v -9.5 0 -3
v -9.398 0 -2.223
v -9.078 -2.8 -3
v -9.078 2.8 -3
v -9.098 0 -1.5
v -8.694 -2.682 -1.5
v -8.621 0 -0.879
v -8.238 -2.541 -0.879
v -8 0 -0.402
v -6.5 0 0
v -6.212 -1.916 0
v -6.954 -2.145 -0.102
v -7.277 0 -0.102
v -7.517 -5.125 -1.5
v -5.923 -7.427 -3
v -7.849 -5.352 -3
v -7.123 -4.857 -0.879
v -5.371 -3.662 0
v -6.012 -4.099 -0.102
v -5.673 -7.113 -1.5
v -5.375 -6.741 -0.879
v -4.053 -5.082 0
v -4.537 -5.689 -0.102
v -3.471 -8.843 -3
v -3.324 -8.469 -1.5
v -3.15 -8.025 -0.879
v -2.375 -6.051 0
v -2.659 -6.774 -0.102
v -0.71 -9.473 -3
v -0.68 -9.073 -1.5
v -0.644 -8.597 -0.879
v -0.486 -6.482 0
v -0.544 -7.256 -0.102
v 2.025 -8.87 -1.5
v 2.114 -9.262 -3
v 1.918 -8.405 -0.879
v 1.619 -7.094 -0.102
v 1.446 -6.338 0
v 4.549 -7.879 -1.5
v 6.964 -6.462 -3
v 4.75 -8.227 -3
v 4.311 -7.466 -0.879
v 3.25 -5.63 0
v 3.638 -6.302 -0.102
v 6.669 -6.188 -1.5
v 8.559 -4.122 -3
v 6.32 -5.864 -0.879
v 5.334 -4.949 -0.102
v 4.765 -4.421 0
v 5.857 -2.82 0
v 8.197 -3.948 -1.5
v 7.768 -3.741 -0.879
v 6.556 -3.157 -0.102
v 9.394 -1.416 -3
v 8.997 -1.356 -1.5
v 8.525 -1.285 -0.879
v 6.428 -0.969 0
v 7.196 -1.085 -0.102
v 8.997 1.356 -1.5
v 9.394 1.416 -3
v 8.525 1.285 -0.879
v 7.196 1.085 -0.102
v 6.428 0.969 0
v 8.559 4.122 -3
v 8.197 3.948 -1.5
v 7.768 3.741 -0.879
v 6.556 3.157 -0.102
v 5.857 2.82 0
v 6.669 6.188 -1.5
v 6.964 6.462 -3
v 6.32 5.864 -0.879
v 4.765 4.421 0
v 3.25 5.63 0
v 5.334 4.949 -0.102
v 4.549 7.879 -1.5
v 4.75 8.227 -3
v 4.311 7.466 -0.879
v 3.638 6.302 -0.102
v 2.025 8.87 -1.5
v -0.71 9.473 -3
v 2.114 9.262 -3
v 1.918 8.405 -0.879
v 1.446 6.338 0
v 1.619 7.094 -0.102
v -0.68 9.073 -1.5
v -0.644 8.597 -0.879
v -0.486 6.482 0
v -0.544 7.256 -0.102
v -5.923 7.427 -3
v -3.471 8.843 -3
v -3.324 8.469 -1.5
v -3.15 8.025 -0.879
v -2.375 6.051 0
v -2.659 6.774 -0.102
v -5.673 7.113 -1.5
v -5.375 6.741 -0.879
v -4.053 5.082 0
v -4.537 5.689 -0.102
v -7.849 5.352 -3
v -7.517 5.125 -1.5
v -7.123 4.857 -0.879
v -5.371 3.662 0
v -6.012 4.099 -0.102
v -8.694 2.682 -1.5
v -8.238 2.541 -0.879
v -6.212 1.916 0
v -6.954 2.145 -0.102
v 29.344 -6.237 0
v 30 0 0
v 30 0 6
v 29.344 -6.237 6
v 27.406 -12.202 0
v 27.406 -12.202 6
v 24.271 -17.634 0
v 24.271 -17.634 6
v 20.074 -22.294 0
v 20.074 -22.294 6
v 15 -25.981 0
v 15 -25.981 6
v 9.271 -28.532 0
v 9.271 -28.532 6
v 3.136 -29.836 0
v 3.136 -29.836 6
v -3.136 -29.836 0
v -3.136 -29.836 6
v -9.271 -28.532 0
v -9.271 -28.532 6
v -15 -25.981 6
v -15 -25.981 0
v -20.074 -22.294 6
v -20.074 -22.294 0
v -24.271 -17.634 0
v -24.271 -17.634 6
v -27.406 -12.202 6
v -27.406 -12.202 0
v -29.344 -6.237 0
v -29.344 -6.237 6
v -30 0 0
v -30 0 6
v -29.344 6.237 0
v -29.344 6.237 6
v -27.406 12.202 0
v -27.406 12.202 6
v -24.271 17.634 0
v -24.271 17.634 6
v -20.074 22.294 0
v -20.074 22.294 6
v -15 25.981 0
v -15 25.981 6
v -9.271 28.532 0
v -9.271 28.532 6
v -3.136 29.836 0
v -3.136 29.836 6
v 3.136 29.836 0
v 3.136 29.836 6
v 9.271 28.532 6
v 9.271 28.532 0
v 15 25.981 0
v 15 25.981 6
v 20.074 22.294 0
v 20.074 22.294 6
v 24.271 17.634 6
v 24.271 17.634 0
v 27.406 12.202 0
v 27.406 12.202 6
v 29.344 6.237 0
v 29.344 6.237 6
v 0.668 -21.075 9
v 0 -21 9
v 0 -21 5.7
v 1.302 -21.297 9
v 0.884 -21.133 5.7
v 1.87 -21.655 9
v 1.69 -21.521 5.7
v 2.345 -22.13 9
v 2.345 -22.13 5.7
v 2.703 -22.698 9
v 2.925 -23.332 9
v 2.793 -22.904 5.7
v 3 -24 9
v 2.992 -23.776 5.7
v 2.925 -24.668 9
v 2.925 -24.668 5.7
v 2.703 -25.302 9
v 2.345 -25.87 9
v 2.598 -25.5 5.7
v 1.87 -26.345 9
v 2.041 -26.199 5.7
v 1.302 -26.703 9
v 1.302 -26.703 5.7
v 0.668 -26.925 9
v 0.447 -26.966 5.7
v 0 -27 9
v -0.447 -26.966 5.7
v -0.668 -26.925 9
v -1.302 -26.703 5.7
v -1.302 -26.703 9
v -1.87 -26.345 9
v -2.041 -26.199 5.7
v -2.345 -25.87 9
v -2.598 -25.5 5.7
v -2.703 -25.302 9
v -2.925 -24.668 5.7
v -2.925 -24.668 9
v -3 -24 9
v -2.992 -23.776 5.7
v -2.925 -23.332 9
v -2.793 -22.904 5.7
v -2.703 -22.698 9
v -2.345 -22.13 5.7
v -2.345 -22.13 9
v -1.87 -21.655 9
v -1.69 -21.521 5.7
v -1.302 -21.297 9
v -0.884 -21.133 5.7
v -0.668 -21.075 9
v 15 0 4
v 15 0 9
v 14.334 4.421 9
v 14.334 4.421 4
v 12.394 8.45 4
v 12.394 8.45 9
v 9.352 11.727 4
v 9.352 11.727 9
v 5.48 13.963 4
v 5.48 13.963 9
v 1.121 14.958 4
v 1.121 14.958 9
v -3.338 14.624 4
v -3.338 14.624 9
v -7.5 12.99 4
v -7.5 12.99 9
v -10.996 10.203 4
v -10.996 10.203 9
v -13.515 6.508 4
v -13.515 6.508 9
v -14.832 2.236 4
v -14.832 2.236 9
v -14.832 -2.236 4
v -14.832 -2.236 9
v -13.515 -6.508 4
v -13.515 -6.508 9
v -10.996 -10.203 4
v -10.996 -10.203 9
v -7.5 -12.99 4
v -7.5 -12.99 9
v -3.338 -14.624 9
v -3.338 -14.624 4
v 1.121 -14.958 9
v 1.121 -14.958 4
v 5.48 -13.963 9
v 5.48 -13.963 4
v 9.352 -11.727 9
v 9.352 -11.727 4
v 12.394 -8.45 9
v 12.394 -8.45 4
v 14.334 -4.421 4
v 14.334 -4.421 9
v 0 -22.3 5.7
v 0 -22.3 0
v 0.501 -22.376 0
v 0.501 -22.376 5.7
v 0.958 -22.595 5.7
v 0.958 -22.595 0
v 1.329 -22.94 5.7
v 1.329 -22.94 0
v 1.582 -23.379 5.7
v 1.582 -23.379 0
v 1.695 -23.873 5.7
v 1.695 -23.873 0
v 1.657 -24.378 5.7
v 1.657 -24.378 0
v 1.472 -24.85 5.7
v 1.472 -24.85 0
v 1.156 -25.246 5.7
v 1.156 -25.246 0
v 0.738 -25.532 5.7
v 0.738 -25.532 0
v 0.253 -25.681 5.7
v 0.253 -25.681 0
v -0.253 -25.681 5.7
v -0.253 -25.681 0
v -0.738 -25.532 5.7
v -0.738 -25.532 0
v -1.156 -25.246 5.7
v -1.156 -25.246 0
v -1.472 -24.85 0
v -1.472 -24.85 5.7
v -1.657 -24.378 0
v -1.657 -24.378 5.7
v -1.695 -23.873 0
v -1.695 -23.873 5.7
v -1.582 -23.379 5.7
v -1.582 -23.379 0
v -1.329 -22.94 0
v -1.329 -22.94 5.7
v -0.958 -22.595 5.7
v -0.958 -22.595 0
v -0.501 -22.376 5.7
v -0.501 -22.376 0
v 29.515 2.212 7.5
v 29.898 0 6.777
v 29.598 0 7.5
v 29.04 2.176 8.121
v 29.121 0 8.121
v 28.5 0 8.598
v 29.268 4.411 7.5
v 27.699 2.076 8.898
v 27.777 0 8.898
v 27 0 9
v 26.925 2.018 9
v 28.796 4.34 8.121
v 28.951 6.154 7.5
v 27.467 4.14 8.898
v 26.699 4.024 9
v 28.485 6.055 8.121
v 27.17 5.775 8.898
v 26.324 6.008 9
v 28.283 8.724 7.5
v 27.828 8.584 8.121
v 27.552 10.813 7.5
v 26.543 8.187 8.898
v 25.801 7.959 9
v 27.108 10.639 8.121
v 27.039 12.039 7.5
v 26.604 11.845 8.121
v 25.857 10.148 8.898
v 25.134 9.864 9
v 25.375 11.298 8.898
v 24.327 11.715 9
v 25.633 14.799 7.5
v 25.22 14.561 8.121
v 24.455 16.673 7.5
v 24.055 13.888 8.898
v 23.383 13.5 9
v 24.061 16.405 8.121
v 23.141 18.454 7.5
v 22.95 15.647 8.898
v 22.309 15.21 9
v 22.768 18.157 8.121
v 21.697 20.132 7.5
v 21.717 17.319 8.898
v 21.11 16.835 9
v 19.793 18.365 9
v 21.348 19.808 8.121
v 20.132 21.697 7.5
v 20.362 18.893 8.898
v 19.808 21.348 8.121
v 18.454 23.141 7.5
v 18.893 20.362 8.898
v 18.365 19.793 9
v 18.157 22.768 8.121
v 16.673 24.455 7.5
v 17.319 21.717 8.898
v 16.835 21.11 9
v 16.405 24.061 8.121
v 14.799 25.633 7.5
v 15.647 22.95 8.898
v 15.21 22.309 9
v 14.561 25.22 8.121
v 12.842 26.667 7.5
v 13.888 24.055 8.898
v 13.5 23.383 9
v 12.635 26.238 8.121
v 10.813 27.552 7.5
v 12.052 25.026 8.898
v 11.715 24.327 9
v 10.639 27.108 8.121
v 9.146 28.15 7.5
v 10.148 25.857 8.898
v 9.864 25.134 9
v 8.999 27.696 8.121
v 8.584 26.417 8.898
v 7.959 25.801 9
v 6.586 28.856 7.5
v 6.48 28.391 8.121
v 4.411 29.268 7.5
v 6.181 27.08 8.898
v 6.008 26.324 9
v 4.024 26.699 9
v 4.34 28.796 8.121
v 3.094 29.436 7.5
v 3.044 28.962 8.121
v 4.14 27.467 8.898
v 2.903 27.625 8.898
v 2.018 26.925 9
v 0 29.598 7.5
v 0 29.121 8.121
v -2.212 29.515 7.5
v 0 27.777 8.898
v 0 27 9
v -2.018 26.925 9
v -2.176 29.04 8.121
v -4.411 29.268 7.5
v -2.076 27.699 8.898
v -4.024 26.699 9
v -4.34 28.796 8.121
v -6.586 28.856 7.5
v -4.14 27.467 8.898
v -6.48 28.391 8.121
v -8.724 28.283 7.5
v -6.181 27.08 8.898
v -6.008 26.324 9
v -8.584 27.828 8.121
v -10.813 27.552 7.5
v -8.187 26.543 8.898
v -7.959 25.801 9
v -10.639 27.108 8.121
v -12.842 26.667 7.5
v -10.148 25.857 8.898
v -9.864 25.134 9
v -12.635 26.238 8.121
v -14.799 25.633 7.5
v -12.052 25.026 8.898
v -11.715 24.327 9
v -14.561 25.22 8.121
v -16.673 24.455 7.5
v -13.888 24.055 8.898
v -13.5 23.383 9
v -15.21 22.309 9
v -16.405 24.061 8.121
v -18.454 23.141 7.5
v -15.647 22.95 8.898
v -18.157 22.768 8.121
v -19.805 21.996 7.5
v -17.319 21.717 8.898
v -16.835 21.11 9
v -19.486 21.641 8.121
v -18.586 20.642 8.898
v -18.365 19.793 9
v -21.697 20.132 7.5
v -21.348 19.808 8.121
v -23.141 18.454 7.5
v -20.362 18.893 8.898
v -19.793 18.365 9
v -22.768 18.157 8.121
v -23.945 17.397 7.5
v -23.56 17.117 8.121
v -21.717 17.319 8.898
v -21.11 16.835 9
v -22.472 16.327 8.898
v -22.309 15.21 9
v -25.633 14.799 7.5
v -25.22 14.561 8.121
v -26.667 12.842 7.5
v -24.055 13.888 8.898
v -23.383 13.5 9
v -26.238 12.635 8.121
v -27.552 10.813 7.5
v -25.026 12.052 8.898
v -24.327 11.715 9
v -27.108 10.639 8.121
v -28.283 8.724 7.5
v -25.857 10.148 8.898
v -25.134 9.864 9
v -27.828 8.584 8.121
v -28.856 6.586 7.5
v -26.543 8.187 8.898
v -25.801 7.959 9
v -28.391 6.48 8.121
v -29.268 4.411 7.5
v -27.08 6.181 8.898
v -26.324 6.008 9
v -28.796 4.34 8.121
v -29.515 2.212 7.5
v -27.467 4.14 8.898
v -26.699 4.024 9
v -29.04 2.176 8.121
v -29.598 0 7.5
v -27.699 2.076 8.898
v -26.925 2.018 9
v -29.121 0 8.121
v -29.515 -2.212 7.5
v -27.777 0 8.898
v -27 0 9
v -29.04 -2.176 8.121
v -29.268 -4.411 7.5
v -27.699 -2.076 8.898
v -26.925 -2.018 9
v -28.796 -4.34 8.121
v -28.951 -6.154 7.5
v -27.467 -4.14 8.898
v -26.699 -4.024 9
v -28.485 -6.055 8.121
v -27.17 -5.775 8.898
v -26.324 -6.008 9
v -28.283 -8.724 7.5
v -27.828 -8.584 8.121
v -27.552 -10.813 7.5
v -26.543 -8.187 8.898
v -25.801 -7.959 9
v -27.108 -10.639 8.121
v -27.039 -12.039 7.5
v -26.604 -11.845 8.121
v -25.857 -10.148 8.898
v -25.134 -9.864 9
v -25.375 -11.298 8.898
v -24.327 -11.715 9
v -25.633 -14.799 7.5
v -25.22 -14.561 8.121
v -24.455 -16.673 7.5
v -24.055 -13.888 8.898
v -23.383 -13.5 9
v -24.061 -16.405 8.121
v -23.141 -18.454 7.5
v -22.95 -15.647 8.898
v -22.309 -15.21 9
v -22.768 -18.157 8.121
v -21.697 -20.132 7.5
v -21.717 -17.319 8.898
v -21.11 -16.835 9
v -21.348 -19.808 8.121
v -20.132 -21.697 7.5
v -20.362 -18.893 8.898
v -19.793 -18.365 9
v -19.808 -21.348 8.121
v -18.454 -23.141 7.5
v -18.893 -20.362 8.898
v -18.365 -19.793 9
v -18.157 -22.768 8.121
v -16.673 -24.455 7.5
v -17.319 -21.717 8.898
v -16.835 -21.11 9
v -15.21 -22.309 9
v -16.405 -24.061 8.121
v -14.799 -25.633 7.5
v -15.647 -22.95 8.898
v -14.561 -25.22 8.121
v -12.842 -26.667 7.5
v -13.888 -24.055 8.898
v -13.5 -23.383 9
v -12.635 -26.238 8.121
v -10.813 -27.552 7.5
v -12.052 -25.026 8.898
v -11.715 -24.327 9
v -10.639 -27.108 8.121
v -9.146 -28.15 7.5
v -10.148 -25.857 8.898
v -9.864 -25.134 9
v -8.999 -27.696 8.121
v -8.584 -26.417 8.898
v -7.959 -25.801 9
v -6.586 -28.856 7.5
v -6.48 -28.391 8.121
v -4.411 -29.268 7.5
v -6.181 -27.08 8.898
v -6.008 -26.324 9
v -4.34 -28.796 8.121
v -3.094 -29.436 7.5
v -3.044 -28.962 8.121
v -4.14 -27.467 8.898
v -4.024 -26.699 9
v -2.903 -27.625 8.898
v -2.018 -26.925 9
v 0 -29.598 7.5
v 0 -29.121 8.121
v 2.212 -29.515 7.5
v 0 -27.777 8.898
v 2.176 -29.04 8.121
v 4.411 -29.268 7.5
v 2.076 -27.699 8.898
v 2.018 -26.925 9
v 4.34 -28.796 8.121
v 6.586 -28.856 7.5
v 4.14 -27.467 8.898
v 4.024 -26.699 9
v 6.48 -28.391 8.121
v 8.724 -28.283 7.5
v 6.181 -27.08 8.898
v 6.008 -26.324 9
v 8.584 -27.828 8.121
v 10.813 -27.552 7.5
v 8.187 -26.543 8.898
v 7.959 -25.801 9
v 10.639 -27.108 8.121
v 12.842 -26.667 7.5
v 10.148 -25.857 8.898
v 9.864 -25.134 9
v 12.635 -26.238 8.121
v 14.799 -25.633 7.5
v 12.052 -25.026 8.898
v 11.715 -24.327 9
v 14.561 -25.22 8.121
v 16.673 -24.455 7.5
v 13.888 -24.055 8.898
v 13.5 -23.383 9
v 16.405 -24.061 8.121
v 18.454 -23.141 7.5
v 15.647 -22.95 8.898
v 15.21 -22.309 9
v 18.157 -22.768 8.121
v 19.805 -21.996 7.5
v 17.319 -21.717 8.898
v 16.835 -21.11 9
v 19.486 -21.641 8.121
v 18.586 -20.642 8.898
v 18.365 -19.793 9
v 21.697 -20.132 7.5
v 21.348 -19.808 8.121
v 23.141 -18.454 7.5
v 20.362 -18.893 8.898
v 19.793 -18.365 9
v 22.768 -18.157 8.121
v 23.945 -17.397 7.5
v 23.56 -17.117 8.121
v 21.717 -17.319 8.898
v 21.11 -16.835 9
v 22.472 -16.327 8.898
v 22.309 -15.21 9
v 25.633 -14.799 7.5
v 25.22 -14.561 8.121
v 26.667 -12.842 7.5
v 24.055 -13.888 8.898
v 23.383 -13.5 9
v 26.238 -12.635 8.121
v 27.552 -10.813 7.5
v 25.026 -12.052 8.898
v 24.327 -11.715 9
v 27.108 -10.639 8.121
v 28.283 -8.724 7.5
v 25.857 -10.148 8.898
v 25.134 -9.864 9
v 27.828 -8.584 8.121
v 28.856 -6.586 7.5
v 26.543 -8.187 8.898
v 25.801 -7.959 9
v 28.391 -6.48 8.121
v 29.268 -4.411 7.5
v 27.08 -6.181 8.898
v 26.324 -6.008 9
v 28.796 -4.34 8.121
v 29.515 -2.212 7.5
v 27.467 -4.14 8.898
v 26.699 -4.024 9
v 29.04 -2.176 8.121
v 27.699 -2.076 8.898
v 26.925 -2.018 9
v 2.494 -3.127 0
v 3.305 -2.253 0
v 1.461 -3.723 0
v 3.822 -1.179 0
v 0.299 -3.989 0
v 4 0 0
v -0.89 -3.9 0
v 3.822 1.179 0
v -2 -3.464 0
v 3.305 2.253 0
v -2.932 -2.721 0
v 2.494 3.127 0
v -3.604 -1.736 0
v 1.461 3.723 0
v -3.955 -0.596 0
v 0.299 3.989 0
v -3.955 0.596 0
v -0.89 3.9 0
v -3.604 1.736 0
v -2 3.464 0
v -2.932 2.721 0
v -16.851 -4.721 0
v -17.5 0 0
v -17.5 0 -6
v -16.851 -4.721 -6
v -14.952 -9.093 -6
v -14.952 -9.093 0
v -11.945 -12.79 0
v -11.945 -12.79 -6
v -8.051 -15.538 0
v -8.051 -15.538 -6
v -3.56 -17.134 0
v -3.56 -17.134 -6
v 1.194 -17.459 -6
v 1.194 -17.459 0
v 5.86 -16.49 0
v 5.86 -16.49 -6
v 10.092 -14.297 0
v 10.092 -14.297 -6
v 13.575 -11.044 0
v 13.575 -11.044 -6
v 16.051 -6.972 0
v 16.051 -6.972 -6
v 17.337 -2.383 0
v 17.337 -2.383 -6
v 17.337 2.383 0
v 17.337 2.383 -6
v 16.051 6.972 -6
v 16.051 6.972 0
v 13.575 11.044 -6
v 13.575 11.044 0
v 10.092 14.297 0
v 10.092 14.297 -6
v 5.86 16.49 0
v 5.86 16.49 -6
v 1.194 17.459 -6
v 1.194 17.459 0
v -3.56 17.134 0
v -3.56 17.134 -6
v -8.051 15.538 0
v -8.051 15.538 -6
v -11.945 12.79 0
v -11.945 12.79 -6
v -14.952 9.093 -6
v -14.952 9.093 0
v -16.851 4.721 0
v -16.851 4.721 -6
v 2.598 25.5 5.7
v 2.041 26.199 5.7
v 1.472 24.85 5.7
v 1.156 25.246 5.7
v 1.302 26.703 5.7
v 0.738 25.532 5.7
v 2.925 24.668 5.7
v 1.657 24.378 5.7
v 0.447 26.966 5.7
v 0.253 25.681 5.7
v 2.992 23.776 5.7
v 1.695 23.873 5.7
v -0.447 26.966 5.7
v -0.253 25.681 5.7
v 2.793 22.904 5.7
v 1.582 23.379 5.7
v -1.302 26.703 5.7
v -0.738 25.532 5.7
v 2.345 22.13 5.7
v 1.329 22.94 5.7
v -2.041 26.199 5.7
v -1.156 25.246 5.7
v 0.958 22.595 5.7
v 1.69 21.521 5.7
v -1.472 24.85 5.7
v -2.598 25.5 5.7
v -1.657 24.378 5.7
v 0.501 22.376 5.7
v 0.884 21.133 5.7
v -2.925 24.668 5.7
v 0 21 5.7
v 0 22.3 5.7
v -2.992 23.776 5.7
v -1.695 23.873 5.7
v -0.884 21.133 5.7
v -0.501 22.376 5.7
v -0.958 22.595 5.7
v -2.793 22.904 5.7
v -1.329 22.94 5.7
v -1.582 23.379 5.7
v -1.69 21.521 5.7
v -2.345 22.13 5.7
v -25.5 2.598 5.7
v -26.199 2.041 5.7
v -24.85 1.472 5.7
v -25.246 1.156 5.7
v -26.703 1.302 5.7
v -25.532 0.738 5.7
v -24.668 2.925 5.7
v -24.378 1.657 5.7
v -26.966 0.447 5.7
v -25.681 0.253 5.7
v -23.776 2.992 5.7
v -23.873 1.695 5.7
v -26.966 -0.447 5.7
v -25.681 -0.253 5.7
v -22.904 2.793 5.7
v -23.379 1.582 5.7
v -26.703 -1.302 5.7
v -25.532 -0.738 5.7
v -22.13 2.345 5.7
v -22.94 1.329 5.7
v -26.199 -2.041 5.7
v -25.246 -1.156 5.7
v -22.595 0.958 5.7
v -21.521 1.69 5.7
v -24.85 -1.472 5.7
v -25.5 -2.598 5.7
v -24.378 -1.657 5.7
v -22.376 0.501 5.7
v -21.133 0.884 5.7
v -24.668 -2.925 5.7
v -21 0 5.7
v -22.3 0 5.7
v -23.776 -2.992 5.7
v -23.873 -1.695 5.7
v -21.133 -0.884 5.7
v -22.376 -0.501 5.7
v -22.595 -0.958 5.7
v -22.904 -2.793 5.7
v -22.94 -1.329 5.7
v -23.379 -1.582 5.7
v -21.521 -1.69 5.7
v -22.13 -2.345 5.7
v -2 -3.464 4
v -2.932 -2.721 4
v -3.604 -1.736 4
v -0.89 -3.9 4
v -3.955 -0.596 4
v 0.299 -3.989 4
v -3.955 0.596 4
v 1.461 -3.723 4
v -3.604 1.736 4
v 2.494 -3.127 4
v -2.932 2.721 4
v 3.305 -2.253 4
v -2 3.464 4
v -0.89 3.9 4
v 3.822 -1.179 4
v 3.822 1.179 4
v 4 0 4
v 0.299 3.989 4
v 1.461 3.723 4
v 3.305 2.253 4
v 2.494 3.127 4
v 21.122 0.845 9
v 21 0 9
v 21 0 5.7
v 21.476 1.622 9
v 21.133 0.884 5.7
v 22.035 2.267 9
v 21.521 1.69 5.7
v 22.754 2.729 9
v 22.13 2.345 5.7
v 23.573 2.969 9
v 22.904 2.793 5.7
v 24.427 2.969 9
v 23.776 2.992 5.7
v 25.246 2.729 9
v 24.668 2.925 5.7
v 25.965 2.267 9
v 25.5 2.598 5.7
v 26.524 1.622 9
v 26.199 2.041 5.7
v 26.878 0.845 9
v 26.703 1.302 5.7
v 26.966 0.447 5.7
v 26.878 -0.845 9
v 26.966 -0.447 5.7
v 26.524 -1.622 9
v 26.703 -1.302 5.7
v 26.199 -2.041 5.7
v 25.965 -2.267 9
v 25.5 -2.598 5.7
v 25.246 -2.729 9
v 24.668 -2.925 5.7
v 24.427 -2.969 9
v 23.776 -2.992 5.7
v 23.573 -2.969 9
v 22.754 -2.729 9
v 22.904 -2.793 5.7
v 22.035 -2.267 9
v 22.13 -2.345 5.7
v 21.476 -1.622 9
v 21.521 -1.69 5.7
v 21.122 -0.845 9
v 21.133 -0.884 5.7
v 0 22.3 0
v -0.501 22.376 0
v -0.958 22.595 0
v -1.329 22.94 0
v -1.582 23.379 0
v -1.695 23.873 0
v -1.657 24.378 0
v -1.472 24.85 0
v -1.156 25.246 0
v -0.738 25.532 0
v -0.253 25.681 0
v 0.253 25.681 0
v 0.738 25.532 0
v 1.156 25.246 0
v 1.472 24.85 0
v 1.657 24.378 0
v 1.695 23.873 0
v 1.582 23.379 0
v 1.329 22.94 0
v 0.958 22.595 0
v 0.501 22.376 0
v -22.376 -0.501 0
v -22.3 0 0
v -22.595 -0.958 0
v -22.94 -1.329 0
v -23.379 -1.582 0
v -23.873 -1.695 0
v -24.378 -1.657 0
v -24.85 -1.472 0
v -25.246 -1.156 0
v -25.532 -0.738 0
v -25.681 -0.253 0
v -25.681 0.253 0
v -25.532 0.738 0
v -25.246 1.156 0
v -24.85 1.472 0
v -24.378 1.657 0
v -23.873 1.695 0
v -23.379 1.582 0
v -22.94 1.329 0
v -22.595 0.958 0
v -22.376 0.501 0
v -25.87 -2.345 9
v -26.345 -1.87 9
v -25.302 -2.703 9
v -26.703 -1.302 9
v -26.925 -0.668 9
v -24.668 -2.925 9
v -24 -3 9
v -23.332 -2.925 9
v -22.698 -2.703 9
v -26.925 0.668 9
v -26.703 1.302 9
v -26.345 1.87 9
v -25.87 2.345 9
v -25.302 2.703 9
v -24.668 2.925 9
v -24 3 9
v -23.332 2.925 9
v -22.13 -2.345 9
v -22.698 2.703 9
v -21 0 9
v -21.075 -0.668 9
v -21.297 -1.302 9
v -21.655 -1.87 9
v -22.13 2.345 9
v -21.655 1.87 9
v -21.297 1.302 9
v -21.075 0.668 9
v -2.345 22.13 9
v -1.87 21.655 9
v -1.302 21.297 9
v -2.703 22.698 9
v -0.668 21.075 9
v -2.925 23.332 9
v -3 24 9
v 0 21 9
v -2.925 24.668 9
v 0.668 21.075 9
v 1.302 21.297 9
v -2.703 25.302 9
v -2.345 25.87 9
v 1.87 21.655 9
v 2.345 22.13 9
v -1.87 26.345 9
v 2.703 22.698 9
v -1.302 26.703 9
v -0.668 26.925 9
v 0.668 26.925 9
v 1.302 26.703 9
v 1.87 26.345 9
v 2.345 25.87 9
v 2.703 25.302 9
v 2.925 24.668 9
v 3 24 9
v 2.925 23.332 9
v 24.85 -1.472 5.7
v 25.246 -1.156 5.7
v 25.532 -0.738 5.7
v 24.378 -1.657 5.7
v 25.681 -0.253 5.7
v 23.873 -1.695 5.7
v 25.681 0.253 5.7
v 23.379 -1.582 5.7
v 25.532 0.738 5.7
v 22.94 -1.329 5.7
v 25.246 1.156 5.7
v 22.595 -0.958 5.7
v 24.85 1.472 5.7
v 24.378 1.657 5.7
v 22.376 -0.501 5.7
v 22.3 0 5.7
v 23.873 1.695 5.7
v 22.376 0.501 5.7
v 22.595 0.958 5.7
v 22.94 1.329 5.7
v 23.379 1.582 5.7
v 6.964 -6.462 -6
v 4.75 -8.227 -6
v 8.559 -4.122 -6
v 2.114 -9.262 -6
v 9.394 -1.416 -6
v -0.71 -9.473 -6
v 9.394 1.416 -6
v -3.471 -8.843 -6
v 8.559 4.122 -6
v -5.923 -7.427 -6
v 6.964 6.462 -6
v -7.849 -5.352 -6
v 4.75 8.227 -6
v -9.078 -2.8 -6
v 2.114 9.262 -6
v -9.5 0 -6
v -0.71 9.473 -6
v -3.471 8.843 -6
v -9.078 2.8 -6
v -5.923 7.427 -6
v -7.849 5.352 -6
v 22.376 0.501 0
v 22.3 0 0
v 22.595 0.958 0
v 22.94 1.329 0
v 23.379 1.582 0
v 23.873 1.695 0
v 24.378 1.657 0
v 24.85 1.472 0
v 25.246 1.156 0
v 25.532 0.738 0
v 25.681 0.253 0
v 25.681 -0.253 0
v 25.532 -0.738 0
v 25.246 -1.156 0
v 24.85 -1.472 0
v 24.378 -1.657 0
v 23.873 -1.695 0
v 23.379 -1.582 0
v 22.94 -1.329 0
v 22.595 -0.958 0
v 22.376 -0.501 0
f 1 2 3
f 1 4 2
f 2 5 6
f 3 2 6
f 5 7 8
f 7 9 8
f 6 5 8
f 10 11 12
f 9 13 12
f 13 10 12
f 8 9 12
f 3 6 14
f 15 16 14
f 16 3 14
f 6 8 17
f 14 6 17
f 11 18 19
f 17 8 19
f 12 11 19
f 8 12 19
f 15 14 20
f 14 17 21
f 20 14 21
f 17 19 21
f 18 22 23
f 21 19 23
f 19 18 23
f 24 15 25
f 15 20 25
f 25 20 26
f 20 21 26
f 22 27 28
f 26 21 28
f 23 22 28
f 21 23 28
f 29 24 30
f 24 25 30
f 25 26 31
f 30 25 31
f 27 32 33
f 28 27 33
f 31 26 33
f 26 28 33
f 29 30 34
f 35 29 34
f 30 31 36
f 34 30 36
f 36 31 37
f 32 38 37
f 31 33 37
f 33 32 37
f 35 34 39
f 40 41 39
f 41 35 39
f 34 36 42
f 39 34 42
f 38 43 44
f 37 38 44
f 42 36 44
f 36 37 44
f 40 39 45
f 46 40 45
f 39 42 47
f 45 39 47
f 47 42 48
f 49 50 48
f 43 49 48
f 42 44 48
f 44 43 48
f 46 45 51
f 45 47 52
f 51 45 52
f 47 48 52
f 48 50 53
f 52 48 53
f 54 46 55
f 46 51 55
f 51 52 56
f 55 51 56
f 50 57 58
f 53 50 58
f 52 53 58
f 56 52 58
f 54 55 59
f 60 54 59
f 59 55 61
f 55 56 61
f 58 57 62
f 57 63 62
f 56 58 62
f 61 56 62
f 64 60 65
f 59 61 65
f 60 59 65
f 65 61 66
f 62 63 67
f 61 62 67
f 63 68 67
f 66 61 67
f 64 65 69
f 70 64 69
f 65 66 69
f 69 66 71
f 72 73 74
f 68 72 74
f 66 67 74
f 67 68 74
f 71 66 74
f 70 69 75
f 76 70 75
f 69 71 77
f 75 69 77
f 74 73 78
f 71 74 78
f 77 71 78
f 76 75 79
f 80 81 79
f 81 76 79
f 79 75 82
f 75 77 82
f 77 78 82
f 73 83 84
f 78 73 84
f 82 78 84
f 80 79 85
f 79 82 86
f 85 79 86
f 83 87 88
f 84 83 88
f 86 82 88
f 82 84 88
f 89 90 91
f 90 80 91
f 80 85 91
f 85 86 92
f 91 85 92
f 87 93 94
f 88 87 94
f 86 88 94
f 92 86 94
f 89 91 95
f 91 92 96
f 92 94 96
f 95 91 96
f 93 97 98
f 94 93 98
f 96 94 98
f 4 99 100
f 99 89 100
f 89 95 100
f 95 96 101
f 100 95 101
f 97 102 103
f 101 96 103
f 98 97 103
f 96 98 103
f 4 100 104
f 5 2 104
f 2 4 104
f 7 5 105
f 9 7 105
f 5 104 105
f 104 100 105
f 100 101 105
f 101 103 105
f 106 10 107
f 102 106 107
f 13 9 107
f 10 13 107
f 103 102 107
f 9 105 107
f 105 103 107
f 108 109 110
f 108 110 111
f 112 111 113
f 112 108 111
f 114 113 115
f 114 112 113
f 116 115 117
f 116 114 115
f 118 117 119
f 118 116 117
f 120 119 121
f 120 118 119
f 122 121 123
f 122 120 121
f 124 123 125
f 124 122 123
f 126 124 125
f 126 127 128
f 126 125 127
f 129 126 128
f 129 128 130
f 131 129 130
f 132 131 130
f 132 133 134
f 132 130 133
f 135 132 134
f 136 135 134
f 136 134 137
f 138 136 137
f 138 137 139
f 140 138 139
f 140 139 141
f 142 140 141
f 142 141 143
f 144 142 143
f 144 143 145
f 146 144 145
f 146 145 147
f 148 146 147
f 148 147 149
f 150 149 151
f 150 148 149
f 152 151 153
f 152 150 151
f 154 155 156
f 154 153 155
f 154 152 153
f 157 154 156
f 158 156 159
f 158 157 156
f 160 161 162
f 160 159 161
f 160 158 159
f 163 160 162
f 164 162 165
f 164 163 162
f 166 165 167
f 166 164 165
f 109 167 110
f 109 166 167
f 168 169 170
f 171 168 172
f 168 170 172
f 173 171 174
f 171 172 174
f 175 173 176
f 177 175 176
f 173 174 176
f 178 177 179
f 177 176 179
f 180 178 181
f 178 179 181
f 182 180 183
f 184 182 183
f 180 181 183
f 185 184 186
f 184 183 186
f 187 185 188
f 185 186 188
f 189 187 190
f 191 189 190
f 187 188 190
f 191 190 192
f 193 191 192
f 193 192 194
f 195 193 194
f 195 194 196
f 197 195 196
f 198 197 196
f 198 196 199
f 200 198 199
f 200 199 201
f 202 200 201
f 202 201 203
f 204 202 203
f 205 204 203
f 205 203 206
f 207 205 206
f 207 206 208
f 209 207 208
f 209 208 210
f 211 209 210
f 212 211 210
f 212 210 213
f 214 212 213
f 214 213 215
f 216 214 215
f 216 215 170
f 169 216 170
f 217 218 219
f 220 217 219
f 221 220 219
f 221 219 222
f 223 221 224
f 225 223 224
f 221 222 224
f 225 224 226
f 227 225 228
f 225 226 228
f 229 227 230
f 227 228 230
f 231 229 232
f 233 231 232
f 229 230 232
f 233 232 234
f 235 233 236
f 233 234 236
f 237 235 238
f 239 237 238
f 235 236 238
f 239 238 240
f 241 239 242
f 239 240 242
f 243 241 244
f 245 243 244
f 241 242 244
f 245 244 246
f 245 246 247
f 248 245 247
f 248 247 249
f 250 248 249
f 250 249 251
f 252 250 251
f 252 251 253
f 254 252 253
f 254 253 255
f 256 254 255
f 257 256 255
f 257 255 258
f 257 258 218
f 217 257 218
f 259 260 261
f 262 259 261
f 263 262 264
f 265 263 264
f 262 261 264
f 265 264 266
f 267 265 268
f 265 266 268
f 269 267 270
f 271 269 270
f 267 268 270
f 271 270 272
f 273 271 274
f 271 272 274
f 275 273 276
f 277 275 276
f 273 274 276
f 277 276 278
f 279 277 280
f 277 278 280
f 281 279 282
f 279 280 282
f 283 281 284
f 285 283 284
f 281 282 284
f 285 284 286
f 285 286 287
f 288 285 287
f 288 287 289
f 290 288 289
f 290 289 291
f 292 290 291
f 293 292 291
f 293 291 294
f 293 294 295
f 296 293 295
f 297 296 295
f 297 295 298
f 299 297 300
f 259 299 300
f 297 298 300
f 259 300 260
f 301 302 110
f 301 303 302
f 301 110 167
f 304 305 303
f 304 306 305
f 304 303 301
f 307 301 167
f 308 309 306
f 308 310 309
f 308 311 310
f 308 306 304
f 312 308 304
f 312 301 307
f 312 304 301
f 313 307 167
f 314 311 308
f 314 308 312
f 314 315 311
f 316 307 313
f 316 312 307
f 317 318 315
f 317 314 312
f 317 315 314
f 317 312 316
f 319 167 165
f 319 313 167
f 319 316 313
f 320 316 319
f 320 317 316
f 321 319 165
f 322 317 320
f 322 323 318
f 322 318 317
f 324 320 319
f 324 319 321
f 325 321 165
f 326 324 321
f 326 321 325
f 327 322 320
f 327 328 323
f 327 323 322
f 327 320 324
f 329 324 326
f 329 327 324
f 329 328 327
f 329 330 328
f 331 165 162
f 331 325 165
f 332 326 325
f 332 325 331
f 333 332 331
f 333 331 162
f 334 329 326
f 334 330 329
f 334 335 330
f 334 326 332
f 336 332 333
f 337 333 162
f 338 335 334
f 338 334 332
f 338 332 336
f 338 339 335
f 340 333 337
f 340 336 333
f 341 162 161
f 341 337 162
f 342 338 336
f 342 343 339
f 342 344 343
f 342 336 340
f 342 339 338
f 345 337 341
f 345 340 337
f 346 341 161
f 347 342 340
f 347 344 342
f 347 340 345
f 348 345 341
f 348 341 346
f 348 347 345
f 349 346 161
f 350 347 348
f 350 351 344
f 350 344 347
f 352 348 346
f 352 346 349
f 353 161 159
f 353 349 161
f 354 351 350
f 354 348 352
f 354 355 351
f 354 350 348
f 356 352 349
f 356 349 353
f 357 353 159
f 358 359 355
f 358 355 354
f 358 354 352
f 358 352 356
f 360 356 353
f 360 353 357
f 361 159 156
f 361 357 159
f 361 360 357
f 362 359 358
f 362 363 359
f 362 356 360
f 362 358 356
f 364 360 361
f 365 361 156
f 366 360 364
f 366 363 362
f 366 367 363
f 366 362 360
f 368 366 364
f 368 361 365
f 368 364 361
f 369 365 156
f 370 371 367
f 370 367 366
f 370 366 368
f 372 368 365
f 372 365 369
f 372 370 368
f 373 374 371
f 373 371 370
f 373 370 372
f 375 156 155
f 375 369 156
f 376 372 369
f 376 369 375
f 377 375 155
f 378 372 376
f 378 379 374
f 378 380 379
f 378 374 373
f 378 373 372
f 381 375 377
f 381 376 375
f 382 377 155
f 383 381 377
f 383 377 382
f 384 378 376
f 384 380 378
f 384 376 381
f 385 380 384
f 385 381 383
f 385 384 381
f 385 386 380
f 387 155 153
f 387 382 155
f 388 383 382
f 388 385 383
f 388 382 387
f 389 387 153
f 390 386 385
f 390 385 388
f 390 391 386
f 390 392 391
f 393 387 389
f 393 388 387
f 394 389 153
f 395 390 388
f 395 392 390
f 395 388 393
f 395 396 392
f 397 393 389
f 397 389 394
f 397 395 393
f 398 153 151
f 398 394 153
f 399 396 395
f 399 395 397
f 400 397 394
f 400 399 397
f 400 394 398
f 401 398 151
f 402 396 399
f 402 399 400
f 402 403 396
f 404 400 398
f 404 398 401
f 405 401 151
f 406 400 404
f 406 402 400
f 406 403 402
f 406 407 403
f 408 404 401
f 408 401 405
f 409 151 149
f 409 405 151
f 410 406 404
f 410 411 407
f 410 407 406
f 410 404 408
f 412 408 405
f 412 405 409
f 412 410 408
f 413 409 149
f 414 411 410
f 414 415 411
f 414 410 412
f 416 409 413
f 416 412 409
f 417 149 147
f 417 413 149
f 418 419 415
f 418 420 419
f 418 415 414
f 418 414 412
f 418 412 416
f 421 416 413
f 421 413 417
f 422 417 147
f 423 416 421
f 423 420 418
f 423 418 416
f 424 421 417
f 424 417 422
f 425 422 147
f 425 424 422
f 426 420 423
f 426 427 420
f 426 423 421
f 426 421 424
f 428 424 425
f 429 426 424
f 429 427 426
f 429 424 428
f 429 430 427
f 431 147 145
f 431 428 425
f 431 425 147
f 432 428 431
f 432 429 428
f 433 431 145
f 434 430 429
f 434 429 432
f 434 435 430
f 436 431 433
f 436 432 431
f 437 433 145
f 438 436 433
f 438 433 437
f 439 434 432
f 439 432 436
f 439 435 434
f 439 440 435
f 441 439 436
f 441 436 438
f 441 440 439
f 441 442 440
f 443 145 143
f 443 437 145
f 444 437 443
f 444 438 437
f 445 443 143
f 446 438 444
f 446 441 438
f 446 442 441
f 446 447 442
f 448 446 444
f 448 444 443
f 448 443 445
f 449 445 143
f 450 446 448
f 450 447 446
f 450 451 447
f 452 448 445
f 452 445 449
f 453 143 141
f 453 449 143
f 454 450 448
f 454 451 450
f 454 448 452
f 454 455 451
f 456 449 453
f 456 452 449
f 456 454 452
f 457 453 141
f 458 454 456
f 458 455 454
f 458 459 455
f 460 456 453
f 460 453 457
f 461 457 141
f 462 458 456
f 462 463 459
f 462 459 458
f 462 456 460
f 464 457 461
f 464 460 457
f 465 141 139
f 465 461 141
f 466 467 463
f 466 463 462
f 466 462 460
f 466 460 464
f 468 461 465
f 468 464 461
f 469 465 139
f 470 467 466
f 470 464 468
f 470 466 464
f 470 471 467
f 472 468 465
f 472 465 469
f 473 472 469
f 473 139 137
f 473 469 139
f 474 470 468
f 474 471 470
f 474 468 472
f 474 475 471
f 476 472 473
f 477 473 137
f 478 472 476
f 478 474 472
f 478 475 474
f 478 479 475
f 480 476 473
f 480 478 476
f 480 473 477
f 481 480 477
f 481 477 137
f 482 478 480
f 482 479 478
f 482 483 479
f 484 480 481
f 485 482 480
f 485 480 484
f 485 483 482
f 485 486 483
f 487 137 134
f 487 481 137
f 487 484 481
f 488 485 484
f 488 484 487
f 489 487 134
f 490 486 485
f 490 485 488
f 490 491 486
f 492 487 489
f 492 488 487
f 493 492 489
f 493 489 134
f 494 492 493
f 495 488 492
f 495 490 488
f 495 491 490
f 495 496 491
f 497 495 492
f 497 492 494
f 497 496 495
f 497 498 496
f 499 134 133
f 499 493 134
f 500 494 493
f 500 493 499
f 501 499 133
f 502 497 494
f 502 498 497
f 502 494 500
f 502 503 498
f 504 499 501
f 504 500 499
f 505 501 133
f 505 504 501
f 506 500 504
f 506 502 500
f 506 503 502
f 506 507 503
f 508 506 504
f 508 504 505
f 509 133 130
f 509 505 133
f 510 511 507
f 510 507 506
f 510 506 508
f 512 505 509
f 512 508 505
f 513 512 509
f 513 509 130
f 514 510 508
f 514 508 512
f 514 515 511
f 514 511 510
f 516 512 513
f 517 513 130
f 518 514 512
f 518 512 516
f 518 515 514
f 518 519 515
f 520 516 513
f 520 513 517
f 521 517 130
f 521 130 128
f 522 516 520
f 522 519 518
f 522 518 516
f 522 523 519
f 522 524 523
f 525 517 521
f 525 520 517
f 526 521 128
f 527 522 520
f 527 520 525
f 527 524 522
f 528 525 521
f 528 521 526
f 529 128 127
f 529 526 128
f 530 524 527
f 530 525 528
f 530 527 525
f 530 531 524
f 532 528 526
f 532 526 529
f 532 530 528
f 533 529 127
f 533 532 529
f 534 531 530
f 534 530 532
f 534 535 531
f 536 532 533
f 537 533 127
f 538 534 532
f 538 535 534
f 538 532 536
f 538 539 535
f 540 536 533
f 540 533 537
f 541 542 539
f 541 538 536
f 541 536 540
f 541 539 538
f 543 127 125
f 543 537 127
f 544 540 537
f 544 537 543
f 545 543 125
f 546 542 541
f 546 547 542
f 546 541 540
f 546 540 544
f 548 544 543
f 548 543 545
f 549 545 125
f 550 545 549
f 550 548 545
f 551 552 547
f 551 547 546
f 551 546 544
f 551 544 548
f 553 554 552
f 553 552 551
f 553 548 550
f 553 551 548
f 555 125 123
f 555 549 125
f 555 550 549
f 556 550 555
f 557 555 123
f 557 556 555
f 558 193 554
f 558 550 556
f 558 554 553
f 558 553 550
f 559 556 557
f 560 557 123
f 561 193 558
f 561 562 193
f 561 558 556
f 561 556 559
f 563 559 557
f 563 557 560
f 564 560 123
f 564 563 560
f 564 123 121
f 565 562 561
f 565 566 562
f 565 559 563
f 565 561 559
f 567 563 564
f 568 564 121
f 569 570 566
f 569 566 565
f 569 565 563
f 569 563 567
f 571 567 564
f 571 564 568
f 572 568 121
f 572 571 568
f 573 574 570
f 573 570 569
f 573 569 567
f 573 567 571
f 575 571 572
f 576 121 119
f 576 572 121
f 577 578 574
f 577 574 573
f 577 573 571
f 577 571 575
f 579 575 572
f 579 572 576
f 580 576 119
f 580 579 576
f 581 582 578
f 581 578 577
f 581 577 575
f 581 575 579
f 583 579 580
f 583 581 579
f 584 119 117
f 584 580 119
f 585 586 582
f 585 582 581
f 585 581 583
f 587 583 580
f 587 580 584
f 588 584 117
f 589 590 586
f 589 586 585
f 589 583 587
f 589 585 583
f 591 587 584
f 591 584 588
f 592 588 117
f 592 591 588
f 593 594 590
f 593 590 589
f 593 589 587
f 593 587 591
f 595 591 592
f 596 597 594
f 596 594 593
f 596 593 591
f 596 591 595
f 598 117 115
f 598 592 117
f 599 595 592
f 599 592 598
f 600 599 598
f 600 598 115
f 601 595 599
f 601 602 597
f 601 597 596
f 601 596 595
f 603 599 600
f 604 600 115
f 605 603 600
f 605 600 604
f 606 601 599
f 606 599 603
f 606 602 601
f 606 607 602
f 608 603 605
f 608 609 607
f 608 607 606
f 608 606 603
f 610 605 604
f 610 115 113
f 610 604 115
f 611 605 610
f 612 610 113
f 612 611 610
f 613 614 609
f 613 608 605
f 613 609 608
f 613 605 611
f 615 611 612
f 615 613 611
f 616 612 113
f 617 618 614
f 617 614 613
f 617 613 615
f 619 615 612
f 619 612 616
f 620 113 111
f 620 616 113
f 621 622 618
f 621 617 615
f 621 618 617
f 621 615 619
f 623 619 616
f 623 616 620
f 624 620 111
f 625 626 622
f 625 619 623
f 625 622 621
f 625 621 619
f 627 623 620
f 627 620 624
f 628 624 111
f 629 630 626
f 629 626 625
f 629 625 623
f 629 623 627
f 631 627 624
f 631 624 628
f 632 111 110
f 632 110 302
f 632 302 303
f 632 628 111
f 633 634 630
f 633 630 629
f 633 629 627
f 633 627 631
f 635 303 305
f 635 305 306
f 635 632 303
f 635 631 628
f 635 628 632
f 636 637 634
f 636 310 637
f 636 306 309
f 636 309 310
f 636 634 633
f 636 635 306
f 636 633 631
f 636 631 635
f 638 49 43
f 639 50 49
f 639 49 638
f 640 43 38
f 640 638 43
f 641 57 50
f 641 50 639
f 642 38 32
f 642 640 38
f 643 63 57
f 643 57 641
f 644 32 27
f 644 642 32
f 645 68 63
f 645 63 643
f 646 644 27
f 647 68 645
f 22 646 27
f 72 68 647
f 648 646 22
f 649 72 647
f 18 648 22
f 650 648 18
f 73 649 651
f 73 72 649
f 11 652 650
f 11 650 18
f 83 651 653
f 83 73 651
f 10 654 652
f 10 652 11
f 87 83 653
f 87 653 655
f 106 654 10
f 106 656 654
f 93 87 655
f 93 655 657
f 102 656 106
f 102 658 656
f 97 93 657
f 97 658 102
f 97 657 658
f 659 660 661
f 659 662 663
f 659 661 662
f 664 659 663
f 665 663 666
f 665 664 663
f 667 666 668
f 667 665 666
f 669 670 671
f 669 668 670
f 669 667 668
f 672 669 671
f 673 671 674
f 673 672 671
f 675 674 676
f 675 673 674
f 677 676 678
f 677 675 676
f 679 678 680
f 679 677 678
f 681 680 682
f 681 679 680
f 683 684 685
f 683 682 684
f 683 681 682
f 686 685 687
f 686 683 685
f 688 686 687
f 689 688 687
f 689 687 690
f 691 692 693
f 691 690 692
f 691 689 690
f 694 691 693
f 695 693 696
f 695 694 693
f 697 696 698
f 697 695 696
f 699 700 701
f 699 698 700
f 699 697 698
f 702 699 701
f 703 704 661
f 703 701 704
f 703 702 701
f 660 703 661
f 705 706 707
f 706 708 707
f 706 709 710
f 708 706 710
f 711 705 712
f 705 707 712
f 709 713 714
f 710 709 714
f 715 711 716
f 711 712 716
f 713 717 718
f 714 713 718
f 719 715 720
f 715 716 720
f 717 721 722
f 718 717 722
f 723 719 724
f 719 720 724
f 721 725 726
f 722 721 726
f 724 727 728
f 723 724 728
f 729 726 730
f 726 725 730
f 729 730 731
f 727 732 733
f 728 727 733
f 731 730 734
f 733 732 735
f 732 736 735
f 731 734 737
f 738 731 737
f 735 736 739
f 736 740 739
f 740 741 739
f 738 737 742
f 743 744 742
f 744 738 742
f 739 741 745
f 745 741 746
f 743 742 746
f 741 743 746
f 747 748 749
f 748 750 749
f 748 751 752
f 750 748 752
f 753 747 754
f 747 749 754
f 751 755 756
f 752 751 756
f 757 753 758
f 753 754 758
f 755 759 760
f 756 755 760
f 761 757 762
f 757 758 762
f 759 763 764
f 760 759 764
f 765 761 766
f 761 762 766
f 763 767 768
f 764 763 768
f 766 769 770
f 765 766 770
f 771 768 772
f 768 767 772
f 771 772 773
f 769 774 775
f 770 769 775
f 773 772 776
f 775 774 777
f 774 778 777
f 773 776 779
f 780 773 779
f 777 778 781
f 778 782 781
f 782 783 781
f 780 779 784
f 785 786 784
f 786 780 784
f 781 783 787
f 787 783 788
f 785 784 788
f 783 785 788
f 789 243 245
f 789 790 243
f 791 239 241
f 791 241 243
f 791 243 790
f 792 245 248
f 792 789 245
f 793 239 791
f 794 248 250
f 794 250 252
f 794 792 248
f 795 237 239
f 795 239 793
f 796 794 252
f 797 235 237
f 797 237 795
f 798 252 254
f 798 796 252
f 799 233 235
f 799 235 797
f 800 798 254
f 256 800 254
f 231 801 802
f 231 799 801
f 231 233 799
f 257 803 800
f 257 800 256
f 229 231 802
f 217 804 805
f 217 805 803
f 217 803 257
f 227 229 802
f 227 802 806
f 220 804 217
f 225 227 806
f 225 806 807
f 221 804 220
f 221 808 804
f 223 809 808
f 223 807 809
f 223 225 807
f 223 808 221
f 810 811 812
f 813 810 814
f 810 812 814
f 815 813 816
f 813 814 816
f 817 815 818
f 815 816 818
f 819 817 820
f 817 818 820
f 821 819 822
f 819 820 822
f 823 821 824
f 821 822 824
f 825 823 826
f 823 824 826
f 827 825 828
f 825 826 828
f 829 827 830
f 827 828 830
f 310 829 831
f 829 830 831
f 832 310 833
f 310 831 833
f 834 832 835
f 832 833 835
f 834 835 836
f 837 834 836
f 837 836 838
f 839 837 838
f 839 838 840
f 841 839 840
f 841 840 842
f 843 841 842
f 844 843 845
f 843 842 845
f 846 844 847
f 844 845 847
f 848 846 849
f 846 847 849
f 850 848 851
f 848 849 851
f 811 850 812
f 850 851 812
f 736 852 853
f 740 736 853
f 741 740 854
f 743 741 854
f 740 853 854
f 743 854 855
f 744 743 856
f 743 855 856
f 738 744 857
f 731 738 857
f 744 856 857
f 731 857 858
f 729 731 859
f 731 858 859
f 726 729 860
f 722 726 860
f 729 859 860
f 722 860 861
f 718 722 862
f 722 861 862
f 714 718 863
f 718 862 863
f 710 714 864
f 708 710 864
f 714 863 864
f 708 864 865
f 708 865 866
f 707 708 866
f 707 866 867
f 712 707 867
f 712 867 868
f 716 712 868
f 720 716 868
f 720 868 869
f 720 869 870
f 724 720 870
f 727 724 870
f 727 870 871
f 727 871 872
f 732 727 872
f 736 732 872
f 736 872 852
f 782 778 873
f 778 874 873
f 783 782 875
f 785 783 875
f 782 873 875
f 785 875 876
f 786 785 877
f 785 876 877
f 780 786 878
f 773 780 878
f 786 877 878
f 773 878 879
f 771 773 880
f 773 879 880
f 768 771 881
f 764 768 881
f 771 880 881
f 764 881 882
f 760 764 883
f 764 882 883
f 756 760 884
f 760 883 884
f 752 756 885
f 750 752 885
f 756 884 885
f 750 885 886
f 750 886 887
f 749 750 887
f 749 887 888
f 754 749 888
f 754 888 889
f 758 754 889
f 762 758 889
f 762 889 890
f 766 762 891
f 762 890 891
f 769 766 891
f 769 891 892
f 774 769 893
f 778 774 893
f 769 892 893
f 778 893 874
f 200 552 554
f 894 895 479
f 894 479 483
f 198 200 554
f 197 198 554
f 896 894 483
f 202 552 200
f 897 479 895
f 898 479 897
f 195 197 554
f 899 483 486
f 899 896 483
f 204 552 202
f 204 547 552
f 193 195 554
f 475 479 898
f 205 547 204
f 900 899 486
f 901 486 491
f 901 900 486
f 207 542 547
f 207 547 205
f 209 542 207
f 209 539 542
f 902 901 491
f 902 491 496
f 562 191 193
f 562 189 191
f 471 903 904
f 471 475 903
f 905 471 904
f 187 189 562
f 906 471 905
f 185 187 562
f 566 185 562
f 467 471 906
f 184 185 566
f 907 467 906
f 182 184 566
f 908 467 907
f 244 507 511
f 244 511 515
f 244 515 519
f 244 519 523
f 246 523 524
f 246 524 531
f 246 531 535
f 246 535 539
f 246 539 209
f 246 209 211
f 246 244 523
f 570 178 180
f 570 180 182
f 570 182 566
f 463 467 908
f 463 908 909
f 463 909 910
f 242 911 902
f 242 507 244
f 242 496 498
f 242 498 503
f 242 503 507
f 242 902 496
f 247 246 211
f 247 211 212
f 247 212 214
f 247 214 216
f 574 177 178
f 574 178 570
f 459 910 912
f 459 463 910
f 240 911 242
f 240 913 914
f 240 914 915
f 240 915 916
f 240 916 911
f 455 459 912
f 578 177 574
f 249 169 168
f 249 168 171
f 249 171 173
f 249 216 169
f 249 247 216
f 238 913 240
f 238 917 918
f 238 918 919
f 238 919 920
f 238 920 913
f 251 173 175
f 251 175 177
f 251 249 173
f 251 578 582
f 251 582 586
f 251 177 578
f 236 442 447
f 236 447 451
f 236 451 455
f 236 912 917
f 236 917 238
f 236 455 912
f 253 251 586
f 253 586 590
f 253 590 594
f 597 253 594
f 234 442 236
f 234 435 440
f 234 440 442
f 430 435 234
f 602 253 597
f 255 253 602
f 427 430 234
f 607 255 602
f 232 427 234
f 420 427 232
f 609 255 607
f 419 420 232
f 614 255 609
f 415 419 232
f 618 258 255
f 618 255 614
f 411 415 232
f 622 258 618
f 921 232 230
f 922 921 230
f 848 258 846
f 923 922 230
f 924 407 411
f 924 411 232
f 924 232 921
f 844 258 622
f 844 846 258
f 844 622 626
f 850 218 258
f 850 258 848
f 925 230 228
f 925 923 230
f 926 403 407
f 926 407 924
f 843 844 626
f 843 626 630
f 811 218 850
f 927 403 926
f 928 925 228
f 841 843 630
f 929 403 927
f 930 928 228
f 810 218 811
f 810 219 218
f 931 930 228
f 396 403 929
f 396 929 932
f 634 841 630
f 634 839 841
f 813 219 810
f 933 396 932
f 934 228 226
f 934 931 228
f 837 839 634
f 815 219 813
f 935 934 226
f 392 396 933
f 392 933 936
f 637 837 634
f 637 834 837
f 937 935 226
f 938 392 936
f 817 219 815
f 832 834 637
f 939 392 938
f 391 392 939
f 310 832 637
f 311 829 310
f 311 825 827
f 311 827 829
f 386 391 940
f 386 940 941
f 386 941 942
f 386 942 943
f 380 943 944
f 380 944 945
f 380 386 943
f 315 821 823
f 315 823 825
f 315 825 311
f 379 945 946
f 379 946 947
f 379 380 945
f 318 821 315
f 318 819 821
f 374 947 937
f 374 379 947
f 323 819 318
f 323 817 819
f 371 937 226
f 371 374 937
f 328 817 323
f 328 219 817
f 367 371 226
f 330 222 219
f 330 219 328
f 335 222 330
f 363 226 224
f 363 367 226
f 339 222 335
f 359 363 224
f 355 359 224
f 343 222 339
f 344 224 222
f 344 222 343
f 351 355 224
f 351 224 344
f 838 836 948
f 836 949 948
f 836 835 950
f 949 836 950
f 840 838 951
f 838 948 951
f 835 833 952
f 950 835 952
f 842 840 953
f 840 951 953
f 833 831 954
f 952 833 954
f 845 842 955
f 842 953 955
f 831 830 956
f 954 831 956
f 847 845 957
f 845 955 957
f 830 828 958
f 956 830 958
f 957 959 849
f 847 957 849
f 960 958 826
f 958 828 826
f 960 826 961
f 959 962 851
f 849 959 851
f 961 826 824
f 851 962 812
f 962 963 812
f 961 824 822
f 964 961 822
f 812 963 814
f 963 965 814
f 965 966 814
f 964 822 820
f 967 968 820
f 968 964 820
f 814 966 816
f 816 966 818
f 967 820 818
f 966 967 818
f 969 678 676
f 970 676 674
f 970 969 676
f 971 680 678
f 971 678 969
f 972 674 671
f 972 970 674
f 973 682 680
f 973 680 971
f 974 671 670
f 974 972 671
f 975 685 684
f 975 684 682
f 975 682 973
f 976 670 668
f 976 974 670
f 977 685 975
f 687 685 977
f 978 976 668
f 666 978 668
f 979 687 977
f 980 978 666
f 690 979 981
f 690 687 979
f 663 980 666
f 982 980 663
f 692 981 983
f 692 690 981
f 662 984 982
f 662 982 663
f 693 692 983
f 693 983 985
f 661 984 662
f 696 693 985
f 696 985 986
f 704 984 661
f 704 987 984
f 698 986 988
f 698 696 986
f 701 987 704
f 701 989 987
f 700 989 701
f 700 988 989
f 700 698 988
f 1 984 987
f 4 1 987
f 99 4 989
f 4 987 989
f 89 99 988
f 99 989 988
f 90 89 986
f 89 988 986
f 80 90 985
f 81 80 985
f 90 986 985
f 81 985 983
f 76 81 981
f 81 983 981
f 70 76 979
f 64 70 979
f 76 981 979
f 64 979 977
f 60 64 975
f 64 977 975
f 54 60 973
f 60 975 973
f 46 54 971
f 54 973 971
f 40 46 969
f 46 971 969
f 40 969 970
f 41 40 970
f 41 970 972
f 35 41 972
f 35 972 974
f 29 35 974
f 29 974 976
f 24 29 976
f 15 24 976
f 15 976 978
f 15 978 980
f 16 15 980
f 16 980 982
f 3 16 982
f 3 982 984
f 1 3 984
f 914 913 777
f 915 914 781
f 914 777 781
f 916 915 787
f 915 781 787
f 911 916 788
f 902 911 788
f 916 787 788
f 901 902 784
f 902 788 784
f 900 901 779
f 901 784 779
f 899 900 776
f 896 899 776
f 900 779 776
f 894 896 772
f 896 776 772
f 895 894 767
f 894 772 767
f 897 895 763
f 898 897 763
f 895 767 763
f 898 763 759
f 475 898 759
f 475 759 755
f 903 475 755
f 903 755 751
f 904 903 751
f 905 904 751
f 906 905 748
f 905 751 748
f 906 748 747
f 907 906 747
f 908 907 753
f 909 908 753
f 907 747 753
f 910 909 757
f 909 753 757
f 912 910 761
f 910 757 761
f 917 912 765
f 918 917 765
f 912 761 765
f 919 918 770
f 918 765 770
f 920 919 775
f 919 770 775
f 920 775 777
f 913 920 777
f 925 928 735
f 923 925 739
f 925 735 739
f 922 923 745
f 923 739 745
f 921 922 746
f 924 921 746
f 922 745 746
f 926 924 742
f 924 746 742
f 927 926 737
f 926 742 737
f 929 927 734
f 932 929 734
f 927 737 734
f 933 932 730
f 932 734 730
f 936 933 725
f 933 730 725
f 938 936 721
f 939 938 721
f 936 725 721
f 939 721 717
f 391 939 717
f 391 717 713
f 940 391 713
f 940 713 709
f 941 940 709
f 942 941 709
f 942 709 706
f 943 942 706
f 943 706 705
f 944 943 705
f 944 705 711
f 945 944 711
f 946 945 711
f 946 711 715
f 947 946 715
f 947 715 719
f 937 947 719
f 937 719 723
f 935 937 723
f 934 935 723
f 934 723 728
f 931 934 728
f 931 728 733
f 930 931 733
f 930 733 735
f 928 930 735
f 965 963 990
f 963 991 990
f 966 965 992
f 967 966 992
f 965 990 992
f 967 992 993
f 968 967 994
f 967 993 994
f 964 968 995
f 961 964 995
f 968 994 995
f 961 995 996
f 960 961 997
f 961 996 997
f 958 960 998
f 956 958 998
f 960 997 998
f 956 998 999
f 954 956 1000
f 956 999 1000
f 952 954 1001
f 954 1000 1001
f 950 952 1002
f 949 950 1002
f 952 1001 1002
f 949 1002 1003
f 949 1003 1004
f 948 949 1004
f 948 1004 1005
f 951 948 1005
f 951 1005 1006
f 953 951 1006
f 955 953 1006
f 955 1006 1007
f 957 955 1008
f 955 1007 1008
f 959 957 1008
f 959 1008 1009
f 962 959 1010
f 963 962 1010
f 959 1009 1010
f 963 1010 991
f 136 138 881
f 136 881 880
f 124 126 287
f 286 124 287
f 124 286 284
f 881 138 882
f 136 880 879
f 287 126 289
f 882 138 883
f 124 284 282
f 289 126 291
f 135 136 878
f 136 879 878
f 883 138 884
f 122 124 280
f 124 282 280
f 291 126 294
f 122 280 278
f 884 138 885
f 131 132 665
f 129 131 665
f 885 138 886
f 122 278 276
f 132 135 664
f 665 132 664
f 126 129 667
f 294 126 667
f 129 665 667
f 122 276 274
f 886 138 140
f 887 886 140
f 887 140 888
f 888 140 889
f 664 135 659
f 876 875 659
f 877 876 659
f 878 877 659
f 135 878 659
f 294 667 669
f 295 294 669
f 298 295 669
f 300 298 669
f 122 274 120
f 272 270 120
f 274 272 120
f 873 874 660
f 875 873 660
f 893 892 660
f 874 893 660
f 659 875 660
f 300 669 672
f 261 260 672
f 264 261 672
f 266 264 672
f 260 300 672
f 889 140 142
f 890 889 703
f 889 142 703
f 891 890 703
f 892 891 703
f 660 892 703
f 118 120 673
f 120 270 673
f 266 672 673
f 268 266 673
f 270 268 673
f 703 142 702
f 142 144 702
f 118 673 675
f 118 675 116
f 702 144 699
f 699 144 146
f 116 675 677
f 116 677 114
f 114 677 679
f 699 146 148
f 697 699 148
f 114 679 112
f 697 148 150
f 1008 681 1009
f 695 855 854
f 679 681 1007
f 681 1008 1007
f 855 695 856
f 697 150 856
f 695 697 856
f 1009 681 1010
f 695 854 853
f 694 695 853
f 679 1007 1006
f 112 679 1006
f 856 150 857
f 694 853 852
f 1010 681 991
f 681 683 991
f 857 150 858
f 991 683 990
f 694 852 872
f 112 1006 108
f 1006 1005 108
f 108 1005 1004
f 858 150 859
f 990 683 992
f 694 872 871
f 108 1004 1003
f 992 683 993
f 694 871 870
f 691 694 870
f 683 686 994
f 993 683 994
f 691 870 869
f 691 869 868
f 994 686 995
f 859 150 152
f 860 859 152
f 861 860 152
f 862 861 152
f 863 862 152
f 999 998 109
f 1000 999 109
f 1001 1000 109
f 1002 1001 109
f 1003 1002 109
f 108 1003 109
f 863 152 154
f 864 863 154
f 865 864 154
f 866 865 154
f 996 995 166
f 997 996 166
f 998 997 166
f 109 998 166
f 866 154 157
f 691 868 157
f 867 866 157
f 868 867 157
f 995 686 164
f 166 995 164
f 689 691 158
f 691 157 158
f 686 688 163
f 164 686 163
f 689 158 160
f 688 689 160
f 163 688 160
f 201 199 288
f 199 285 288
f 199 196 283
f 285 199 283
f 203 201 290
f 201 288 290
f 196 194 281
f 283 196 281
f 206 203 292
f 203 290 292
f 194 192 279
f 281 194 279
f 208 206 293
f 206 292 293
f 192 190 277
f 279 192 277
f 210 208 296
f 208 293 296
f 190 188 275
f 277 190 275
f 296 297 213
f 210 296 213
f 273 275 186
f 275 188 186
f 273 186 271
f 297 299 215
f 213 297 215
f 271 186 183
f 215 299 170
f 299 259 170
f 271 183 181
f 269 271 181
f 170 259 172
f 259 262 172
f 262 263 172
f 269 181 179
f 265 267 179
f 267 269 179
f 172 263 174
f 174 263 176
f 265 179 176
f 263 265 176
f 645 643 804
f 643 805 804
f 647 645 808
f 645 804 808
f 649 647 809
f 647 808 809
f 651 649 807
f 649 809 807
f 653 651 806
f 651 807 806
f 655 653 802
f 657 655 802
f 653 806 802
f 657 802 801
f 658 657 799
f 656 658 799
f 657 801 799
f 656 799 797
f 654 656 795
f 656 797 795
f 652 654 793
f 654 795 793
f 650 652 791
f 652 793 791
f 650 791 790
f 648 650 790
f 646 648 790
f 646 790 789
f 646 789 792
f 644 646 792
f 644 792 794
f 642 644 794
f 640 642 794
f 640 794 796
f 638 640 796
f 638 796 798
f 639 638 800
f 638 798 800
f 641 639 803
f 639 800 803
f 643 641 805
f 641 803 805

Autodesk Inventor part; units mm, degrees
ref_plane "YZ Plane" through (0, 0, 0) normal (1, 0, 0) x (0, 1, 0)
ref_plane "XZ Plane" through (0, 0, 0) normal (0, 1, 0) x (-1, 0, 0)
ref_plane "XY Plane" through (0, 0, 0) normal (0, 0, 1) x (1, 0, 0)
sketch "스케치4" plane through (0, 0, 0) normal (0, 0, 1) x (1, 0, 0)
  circle A0 centre (0, 0) radius 30
  dimension "d28" = 60
extrude "돌출4" add sketch "스케치4" along normal blind 9
sketch "스케치6" plane through (0, 0, 0) normal (0, 0, -1) x (-1, 0, 0)
  circle A0 centre (0, 0) radius 17.5
  dimension "d34" = 35
extrude "돌출6" add sketch "스케치6" along normal blind 6
sketch "스케치9" plane through (0, 0, -6) normal (0, 0, -1) x (-1, 0, 0)
  circle A0 centre (0, 0) radius 9.5
  dimension "d44" = 19
extrude "돌출9" cut sketch "스케치9" against normal blind 6
sketch "스케치12" plane through (0, 0, 9) normal (0, 0, 1) x (1, 0, 0)
  circle A0 centre (0, 24) radius 3
  point P0 (0, 0)
  dimension "d61" = 6
  dimension "d62" = 24
hole "구멍1" at (0, 24, 9) direction (0, 0, -1) diameter 3.4 end through all counterbore diameter 6 counterbore depth 3.3
sketch "스케치13" plane through (0, 0, 9) normal (0, 0, 1) x (1, 0, 0)
  circle A0 centre (0, 0) radius 15
  dimension "d74" = 30
extrude "돌출11" cut sketch "스케치13" against normal blind 5
sketch "스케치14" plane through (0, 0, 4) normal (0, 0, 1) x (1, 0, 0)
  circle A0 centre (0, 0) radius 4
  dimension "d77" = 8
extrude "돌출12" cut sketch "스케치14" against normal up to next
pattern_circular "원형 패턴3" count 4 over 360 about axis through (0, 0, 4) along (0, 0, -1) of "구멍1"
fillet "모깎기3" radius 3 2 edges at (-30, 0, 9) (9.5, 0, 0)
properties part number "도면2-3번"
